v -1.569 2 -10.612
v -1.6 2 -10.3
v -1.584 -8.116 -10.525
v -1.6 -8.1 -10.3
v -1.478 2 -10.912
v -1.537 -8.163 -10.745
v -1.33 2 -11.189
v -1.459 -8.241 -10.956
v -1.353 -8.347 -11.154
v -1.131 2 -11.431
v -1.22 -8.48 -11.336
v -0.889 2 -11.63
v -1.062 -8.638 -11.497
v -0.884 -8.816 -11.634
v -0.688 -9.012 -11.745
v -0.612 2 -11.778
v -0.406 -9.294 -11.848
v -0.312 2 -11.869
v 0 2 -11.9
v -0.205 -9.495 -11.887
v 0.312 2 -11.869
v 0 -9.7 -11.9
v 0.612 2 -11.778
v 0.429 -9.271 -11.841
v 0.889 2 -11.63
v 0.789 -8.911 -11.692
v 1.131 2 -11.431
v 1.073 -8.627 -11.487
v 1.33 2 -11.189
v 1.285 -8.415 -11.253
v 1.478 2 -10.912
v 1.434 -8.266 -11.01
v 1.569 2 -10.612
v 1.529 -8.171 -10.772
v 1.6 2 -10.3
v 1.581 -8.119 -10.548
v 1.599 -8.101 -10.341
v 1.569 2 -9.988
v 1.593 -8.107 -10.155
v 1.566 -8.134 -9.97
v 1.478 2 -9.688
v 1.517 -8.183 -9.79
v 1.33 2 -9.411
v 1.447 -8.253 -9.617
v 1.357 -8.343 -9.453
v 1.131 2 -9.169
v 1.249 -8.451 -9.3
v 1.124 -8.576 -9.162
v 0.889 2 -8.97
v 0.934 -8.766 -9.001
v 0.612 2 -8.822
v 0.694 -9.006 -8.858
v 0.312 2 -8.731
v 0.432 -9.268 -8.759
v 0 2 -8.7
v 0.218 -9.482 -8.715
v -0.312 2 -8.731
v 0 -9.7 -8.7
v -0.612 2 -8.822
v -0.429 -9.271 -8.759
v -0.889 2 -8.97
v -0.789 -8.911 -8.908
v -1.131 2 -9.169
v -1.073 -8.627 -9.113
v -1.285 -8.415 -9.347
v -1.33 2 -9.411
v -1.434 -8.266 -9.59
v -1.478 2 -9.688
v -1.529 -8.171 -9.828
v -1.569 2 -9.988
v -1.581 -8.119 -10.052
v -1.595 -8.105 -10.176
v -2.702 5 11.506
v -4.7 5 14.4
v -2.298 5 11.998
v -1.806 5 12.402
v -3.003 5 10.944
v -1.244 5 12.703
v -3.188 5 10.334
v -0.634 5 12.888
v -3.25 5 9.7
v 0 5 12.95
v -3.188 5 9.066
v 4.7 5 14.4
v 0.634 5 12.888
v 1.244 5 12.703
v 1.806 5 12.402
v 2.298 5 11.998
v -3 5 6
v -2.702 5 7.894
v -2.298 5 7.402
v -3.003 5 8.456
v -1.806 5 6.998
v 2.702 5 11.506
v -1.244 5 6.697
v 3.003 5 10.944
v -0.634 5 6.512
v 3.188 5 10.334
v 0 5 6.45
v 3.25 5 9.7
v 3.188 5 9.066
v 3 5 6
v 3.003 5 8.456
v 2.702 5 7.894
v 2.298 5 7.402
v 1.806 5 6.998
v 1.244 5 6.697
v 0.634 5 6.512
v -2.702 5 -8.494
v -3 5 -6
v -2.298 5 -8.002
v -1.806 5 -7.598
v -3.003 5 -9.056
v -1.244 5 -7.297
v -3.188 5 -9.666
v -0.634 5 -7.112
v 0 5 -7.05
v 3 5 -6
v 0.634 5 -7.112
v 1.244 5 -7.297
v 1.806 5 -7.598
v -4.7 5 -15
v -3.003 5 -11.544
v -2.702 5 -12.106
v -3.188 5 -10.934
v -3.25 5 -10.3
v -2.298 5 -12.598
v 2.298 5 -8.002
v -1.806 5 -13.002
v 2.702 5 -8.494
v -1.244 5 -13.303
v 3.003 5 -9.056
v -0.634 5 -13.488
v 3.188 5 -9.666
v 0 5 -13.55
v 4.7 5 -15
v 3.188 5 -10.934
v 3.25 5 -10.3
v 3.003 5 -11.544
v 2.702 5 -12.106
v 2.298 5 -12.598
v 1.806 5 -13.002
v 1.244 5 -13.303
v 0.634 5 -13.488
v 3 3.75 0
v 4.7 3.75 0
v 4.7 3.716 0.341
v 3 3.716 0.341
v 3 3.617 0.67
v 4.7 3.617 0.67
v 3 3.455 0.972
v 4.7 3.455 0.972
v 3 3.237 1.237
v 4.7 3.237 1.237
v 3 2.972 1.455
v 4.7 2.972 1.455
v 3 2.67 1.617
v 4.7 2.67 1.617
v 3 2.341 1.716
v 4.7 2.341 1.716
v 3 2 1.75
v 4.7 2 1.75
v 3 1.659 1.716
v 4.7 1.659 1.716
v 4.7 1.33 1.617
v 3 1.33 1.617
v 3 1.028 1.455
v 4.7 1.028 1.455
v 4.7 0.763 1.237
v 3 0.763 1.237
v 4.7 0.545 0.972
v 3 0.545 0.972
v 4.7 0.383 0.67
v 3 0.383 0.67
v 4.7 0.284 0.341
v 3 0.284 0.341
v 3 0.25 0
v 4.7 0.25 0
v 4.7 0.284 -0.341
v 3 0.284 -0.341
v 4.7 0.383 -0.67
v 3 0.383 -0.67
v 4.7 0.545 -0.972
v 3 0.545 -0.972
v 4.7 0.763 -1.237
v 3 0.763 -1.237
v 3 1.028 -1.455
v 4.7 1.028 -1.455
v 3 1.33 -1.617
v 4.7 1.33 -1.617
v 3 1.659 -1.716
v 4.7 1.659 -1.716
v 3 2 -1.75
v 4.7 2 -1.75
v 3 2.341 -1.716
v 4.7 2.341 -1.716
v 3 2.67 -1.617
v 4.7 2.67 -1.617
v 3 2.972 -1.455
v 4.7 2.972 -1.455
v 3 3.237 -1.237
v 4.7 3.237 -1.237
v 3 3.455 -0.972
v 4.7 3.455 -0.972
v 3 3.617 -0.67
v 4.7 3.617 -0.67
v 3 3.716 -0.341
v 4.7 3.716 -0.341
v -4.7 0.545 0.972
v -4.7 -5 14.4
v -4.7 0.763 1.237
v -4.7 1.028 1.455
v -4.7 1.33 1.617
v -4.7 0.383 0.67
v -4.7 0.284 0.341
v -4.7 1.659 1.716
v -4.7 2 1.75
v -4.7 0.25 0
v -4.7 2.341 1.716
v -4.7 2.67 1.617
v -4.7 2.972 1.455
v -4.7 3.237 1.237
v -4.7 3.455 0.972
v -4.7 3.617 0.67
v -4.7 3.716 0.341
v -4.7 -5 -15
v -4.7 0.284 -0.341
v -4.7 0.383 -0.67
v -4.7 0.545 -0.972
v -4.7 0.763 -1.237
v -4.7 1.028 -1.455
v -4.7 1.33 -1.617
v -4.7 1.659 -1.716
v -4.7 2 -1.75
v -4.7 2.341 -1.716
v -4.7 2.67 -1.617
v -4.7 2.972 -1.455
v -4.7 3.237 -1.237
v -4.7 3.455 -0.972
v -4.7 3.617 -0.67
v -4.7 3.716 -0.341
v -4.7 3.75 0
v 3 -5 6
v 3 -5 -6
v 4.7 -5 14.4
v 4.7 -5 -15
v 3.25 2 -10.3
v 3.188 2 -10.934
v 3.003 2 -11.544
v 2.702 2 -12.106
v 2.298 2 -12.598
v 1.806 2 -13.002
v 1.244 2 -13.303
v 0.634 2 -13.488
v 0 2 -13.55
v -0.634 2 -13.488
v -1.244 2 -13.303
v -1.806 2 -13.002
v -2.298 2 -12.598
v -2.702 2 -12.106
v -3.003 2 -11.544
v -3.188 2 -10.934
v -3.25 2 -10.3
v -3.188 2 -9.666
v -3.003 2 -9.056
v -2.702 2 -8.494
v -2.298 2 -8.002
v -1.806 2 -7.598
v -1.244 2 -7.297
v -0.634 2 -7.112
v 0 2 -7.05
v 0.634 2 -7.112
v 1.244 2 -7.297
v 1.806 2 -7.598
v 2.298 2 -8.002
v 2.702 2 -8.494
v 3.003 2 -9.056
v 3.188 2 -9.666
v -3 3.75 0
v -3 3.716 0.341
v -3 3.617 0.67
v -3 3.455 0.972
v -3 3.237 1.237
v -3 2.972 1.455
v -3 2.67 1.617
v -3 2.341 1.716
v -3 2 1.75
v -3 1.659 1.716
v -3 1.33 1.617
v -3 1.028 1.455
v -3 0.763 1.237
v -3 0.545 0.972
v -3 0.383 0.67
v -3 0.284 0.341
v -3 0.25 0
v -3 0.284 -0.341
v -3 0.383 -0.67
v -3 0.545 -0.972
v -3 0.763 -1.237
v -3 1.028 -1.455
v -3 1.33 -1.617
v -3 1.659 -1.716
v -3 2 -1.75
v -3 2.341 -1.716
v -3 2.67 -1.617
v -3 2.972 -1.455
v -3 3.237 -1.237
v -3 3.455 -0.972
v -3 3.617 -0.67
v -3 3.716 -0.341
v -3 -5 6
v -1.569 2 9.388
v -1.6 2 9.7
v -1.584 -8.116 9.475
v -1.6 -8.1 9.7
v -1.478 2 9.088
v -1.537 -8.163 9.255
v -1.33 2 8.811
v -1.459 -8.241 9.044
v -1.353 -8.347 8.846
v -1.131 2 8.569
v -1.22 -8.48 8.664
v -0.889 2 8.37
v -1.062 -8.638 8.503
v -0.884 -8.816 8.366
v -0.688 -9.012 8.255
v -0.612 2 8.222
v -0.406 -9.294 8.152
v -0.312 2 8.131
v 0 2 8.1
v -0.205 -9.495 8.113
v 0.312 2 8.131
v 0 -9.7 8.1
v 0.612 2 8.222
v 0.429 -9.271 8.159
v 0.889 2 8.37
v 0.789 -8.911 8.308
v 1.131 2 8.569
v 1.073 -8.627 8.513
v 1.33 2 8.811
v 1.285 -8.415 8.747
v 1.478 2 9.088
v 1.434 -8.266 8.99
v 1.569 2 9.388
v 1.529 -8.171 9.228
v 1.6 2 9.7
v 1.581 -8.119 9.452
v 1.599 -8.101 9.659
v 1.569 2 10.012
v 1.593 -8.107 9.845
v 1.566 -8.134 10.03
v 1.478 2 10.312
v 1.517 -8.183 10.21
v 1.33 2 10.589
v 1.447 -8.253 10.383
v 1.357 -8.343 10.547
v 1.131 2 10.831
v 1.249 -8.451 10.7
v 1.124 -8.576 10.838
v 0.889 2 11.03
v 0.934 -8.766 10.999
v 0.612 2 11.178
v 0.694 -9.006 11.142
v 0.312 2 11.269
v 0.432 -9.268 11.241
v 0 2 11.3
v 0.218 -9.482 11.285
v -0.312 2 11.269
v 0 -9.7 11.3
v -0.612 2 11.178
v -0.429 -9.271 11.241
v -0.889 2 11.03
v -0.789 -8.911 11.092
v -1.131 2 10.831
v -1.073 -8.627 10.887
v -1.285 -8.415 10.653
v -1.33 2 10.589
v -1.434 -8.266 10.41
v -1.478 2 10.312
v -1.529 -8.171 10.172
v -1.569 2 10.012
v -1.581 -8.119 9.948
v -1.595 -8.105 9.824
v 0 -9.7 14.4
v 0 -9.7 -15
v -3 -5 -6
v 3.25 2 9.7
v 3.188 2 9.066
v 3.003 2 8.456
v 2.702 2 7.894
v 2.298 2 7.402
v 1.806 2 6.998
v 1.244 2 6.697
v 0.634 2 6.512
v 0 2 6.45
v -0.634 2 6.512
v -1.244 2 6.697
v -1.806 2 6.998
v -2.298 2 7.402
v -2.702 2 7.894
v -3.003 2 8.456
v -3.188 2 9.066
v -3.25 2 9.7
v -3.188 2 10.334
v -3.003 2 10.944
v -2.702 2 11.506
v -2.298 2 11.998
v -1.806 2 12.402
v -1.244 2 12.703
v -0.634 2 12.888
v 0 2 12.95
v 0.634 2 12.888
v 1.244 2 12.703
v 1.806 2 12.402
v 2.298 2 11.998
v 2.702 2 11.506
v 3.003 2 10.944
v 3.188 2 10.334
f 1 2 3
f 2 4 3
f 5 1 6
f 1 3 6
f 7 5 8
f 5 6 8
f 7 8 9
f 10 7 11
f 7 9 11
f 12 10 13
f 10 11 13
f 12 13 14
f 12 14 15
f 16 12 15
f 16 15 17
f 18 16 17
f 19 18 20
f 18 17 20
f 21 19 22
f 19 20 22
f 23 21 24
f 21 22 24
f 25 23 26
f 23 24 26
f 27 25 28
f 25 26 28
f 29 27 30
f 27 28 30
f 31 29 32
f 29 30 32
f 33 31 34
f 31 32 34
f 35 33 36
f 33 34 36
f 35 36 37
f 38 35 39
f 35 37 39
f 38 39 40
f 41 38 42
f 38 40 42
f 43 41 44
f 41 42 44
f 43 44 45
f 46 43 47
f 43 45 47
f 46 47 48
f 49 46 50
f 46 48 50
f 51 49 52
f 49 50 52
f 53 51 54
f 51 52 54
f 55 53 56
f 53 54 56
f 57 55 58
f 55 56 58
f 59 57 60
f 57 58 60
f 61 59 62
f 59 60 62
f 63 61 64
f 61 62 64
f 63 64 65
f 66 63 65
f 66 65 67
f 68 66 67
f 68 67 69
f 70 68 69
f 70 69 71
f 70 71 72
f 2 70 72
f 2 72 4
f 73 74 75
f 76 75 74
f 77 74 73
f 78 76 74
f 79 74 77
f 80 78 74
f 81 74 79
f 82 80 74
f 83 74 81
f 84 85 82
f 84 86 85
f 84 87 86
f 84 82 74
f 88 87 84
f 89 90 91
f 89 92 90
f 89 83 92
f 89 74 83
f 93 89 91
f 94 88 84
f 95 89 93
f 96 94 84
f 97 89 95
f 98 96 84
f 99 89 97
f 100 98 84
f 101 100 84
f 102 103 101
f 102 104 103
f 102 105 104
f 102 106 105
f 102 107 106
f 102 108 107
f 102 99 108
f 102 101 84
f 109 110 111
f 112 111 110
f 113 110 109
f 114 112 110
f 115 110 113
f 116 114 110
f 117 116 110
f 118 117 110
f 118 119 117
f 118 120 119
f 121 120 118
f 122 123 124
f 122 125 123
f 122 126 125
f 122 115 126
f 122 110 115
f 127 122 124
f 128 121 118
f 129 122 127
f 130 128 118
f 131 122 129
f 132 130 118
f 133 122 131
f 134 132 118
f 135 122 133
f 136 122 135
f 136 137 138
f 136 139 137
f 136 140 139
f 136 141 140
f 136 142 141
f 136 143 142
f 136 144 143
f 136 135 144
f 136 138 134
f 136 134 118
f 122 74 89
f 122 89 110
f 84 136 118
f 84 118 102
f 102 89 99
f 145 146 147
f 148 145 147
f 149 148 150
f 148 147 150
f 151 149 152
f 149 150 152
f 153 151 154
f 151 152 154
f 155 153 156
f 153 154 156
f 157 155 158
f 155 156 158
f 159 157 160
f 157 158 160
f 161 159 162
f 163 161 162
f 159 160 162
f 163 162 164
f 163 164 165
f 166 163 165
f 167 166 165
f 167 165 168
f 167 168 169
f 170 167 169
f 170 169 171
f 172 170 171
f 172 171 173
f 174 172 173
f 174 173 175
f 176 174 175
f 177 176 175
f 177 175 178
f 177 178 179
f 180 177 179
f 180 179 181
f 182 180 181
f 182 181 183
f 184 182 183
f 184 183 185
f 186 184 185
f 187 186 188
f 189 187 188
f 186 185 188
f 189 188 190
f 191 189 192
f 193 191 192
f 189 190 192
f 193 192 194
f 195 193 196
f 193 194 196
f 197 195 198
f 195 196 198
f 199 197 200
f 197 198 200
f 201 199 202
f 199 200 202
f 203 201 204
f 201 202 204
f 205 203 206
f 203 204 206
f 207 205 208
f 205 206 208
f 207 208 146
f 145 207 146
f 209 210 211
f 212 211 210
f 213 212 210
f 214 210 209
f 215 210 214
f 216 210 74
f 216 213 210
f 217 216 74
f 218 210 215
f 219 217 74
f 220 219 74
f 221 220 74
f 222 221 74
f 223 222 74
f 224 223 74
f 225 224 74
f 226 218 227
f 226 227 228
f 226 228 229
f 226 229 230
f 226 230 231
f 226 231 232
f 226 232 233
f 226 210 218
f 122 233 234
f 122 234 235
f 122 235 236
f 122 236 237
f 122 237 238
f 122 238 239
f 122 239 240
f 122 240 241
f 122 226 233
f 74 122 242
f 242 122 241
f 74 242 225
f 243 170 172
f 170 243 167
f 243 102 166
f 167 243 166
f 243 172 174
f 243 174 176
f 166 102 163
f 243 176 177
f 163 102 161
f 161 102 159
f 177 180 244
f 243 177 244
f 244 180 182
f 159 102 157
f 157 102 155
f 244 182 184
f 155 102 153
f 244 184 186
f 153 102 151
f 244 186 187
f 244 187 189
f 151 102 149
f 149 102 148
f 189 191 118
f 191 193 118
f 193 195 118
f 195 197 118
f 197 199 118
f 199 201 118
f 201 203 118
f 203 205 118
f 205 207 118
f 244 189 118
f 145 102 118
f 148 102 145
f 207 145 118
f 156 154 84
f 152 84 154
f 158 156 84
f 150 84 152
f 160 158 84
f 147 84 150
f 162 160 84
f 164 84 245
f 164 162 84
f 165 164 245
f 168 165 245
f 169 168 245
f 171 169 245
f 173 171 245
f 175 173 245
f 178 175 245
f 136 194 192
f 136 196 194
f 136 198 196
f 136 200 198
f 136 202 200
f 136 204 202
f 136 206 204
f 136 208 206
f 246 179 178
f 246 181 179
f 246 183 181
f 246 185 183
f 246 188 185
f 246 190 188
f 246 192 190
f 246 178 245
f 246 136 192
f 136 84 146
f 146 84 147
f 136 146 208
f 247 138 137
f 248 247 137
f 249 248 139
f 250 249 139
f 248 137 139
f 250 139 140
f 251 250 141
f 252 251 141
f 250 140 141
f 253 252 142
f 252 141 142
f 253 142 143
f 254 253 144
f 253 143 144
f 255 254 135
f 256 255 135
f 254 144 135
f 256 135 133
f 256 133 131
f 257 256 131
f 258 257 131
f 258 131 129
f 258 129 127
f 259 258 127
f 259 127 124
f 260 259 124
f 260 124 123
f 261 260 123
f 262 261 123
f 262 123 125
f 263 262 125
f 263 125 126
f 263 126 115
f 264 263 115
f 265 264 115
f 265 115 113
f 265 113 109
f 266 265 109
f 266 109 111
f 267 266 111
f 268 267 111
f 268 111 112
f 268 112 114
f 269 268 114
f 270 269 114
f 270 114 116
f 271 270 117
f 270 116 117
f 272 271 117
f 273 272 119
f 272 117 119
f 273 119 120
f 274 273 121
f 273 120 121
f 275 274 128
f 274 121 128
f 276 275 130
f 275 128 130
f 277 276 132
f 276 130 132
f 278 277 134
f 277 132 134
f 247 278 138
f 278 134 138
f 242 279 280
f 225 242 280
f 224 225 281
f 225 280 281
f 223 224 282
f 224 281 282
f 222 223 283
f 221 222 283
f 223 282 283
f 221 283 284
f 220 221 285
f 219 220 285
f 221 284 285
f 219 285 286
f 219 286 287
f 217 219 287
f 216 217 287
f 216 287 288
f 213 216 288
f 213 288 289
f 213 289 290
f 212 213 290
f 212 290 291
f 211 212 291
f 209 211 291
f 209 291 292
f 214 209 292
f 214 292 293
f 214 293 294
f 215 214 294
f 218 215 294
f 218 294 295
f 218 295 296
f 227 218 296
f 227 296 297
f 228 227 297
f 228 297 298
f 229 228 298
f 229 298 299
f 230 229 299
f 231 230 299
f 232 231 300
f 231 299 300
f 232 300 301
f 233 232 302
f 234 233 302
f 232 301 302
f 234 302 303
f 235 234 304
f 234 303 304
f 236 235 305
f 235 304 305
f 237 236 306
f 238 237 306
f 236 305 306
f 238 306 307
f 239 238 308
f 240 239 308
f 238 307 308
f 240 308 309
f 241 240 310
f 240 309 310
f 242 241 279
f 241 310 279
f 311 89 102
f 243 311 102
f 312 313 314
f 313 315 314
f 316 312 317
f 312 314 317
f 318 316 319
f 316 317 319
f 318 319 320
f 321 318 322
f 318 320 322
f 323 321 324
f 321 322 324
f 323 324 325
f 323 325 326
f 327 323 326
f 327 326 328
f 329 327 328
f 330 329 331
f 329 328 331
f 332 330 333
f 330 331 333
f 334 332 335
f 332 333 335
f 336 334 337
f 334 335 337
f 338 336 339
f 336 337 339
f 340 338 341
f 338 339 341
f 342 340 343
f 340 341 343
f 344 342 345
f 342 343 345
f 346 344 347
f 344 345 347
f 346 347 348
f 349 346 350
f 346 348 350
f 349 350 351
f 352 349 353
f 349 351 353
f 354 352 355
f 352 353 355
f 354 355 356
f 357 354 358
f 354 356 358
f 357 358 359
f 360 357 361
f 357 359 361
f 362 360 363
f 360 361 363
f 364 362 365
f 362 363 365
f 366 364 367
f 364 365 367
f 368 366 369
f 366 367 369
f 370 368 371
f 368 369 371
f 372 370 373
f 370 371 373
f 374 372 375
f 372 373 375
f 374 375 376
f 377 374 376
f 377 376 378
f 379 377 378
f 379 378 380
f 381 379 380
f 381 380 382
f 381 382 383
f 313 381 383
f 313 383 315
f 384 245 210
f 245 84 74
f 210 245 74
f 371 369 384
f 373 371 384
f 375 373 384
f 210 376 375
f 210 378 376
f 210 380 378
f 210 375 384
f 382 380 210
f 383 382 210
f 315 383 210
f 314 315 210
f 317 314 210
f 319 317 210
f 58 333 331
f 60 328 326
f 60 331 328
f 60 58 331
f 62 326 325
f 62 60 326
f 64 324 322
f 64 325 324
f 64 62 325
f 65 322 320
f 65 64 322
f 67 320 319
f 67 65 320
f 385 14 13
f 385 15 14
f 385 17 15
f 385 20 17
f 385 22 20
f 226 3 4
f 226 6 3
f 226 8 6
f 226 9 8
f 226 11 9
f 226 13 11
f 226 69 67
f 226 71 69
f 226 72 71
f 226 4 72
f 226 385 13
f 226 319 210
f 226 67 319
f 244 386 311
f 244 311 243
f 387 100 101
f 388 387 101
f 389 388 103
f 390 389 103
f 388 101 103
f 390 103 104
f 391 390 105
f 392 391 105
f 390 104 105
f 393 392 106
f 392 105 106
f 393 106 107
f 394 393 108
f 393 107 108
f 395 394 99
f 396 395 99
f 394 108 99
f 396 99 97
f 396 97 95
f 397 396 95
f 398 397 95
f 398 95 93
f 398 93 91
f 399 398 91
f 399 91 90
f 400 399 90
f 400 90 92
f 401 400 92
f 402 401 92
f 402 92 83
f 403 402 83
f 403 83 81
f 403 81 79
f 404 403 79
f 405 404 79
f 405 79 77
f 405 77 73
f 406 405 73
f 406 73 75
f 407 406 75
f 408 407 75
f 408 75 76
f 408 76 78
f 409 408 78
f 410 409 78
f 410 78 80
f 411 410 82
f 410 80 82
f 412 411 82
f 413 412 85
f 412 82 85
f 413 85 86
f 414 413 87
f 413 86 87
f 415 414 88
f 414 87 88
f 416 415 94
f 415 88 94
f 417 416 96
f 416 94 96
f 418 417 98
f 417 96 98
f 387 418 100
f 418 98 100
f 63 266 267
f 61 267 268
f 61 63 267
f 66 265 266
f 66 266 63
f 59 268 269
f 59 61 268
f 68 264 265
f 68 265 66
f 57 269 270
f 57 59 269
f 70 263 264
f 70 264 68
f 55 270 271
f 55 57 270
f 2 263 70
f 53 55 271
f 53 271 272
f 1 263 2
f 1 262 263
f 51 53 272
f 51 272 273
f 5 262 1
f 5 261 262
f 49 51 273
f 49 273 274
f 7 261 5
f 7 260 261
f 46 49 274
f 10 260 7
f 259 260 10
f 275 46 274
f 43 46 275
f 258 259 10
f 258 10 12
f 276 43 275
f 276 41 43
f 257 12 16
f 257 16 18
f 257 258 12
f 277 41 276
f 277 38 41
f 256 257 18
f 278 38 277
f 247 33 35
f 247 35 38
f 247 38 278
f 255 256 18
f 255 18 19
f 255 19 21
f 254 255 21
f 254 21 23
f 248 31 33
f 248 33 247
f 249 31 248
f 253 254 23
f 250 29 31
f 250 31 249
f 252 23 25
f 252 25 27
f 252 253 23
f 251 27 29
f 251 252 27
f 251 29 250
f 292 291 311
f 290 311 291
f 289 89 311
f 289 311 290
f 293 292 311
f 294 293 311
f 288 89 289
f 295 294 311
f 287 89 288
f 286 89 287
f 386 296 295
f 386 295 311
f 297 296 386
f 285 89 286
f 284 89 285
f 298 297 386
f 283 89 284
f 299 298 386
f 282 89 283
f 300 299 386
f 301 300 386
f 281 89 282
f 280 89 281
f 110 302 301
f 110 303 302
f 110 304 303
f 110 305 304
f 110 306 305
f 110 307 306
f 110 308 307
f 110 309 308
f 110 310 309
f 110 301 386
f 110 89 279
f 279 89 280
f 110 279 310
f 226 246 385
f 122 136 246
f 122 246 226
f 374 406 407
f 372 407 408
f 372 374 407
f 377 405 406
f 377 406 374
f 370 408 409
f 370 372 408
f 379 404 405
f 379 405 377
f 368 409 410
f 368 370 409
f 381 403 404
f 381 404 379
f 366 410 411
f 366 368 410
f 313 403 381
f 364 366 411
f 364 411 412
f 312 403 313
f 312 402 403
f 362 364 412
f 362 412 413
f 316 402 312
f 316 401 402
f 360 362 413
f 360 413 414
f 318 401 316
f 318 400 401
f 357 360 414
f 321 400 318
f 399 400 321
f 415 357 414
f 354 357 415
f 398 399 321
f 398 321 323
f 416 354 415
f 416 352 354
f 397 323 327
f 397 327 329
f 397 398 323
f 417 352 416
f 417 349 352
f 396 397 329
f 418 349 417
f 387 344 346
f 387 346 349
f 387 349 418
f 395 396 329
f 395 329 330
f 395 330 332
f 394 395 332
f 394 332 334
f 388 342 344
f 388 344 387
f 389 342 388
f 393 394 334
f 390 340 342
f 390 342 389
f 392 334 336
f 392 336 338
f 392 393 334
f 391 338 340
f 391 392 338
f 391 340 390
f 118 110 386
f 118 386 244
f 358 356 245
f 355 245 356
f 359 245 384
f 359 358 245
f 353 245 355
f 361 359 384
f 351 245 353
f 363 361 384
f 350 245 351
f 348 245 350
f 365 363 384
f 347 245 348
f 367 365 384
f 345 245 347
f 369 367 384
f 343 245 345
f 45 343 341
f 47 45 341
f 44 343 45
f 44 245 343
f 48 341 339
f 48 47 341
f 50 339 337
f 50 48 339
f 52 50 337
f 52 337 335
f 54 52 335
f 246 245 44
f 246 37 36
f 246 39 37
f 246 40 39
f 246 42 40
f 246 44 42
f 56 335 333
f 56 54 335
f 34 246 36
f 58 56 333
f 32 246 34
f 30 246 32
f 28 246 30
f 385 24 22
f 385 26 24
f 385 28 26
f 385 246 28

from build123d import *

# Parameters (mm, degrees)
BOSS_EXTRUDE1_DEPTH            = 14.4
BOSS_EXTRUDE1_DEPTH_BACK       = 15
SKETCH2_W                      = 6
SKETCH2_H                      = 12
CUT_EXTRUDE1_DEPTH             = 10
SKETCH3_R                      = 1.75
CUT_EXTRUDE2_DEPTH             = 21.185390757
CBORE_FOR_M3_SHCS1_D           = 3.2
CBORE_FOR_M3_SHCS1_CBORE_D     = 6.5
CBORE_FOR_M3_SHCS1_CBORE_DEPTH = 3


with BuildPart() as part:
    # Sketch1 → Boss-Extrude1 (new, two sides: drawn at the far end of the back side and taken through both)
    with BuildSketch(Plane.XY.offset(-BOSS_EXTRUDE1_DEPTH_BACK)):
        Polygon((-4.7, 5), (4.7, 5), (4.7, -5), (0, -9.7), (-4.7, -5), align=None)
    extrude(amount=BOSS_EXTRUDE1_DEPTH + BOSS_EXTRUDE1_DEPTH_BACK)

    # Sketch2 → Cut-Extrude1 (cut)
    with BuildSketch(Plane(origin=(0, 5, 0), x_dir=(1, 0, 0), z_dir=(0, 1, 0))):
        Rectangle(SKETCH2_W, SKETCH2_H)
    extrude(amount=-CUT_EXTRUDE1_DEPTH, mode=Mode.SUBTRACT)

    # Sketch3 → Cut-Extrude2 (cut, through all)
    with BuildSketch(Plane(origin=(4.7, 0, 0), x_dir=(0, 0, -1), z_dir=(1, 0, 0))):
        with Locations(Location((0, 2, 0), (0, 0, 90))):
            Circle(SKETCH3_R)
    extrude(amount=-CUT_EXTRUDE2_DEPTH, mode=Mode.SUBTRACT)

    # CBORE for M3 SHCS1 (through all)
    with Locations(Plane(origin=(0, 5, 0), x_dir=(1, 0, 0), z_dir=(0, 1, 0))):
        with Locations((0, -9.7), (0, 10.3)):
            CounterBoreHole(CBORE_FOR_M3_SHCS1_D / 2, CBORE_FOR_M3_SHCS1_CBORE_D / 2, CBORE_FOR_M3_SHCS1_CBORE_DEPTH)


solid = part.part
